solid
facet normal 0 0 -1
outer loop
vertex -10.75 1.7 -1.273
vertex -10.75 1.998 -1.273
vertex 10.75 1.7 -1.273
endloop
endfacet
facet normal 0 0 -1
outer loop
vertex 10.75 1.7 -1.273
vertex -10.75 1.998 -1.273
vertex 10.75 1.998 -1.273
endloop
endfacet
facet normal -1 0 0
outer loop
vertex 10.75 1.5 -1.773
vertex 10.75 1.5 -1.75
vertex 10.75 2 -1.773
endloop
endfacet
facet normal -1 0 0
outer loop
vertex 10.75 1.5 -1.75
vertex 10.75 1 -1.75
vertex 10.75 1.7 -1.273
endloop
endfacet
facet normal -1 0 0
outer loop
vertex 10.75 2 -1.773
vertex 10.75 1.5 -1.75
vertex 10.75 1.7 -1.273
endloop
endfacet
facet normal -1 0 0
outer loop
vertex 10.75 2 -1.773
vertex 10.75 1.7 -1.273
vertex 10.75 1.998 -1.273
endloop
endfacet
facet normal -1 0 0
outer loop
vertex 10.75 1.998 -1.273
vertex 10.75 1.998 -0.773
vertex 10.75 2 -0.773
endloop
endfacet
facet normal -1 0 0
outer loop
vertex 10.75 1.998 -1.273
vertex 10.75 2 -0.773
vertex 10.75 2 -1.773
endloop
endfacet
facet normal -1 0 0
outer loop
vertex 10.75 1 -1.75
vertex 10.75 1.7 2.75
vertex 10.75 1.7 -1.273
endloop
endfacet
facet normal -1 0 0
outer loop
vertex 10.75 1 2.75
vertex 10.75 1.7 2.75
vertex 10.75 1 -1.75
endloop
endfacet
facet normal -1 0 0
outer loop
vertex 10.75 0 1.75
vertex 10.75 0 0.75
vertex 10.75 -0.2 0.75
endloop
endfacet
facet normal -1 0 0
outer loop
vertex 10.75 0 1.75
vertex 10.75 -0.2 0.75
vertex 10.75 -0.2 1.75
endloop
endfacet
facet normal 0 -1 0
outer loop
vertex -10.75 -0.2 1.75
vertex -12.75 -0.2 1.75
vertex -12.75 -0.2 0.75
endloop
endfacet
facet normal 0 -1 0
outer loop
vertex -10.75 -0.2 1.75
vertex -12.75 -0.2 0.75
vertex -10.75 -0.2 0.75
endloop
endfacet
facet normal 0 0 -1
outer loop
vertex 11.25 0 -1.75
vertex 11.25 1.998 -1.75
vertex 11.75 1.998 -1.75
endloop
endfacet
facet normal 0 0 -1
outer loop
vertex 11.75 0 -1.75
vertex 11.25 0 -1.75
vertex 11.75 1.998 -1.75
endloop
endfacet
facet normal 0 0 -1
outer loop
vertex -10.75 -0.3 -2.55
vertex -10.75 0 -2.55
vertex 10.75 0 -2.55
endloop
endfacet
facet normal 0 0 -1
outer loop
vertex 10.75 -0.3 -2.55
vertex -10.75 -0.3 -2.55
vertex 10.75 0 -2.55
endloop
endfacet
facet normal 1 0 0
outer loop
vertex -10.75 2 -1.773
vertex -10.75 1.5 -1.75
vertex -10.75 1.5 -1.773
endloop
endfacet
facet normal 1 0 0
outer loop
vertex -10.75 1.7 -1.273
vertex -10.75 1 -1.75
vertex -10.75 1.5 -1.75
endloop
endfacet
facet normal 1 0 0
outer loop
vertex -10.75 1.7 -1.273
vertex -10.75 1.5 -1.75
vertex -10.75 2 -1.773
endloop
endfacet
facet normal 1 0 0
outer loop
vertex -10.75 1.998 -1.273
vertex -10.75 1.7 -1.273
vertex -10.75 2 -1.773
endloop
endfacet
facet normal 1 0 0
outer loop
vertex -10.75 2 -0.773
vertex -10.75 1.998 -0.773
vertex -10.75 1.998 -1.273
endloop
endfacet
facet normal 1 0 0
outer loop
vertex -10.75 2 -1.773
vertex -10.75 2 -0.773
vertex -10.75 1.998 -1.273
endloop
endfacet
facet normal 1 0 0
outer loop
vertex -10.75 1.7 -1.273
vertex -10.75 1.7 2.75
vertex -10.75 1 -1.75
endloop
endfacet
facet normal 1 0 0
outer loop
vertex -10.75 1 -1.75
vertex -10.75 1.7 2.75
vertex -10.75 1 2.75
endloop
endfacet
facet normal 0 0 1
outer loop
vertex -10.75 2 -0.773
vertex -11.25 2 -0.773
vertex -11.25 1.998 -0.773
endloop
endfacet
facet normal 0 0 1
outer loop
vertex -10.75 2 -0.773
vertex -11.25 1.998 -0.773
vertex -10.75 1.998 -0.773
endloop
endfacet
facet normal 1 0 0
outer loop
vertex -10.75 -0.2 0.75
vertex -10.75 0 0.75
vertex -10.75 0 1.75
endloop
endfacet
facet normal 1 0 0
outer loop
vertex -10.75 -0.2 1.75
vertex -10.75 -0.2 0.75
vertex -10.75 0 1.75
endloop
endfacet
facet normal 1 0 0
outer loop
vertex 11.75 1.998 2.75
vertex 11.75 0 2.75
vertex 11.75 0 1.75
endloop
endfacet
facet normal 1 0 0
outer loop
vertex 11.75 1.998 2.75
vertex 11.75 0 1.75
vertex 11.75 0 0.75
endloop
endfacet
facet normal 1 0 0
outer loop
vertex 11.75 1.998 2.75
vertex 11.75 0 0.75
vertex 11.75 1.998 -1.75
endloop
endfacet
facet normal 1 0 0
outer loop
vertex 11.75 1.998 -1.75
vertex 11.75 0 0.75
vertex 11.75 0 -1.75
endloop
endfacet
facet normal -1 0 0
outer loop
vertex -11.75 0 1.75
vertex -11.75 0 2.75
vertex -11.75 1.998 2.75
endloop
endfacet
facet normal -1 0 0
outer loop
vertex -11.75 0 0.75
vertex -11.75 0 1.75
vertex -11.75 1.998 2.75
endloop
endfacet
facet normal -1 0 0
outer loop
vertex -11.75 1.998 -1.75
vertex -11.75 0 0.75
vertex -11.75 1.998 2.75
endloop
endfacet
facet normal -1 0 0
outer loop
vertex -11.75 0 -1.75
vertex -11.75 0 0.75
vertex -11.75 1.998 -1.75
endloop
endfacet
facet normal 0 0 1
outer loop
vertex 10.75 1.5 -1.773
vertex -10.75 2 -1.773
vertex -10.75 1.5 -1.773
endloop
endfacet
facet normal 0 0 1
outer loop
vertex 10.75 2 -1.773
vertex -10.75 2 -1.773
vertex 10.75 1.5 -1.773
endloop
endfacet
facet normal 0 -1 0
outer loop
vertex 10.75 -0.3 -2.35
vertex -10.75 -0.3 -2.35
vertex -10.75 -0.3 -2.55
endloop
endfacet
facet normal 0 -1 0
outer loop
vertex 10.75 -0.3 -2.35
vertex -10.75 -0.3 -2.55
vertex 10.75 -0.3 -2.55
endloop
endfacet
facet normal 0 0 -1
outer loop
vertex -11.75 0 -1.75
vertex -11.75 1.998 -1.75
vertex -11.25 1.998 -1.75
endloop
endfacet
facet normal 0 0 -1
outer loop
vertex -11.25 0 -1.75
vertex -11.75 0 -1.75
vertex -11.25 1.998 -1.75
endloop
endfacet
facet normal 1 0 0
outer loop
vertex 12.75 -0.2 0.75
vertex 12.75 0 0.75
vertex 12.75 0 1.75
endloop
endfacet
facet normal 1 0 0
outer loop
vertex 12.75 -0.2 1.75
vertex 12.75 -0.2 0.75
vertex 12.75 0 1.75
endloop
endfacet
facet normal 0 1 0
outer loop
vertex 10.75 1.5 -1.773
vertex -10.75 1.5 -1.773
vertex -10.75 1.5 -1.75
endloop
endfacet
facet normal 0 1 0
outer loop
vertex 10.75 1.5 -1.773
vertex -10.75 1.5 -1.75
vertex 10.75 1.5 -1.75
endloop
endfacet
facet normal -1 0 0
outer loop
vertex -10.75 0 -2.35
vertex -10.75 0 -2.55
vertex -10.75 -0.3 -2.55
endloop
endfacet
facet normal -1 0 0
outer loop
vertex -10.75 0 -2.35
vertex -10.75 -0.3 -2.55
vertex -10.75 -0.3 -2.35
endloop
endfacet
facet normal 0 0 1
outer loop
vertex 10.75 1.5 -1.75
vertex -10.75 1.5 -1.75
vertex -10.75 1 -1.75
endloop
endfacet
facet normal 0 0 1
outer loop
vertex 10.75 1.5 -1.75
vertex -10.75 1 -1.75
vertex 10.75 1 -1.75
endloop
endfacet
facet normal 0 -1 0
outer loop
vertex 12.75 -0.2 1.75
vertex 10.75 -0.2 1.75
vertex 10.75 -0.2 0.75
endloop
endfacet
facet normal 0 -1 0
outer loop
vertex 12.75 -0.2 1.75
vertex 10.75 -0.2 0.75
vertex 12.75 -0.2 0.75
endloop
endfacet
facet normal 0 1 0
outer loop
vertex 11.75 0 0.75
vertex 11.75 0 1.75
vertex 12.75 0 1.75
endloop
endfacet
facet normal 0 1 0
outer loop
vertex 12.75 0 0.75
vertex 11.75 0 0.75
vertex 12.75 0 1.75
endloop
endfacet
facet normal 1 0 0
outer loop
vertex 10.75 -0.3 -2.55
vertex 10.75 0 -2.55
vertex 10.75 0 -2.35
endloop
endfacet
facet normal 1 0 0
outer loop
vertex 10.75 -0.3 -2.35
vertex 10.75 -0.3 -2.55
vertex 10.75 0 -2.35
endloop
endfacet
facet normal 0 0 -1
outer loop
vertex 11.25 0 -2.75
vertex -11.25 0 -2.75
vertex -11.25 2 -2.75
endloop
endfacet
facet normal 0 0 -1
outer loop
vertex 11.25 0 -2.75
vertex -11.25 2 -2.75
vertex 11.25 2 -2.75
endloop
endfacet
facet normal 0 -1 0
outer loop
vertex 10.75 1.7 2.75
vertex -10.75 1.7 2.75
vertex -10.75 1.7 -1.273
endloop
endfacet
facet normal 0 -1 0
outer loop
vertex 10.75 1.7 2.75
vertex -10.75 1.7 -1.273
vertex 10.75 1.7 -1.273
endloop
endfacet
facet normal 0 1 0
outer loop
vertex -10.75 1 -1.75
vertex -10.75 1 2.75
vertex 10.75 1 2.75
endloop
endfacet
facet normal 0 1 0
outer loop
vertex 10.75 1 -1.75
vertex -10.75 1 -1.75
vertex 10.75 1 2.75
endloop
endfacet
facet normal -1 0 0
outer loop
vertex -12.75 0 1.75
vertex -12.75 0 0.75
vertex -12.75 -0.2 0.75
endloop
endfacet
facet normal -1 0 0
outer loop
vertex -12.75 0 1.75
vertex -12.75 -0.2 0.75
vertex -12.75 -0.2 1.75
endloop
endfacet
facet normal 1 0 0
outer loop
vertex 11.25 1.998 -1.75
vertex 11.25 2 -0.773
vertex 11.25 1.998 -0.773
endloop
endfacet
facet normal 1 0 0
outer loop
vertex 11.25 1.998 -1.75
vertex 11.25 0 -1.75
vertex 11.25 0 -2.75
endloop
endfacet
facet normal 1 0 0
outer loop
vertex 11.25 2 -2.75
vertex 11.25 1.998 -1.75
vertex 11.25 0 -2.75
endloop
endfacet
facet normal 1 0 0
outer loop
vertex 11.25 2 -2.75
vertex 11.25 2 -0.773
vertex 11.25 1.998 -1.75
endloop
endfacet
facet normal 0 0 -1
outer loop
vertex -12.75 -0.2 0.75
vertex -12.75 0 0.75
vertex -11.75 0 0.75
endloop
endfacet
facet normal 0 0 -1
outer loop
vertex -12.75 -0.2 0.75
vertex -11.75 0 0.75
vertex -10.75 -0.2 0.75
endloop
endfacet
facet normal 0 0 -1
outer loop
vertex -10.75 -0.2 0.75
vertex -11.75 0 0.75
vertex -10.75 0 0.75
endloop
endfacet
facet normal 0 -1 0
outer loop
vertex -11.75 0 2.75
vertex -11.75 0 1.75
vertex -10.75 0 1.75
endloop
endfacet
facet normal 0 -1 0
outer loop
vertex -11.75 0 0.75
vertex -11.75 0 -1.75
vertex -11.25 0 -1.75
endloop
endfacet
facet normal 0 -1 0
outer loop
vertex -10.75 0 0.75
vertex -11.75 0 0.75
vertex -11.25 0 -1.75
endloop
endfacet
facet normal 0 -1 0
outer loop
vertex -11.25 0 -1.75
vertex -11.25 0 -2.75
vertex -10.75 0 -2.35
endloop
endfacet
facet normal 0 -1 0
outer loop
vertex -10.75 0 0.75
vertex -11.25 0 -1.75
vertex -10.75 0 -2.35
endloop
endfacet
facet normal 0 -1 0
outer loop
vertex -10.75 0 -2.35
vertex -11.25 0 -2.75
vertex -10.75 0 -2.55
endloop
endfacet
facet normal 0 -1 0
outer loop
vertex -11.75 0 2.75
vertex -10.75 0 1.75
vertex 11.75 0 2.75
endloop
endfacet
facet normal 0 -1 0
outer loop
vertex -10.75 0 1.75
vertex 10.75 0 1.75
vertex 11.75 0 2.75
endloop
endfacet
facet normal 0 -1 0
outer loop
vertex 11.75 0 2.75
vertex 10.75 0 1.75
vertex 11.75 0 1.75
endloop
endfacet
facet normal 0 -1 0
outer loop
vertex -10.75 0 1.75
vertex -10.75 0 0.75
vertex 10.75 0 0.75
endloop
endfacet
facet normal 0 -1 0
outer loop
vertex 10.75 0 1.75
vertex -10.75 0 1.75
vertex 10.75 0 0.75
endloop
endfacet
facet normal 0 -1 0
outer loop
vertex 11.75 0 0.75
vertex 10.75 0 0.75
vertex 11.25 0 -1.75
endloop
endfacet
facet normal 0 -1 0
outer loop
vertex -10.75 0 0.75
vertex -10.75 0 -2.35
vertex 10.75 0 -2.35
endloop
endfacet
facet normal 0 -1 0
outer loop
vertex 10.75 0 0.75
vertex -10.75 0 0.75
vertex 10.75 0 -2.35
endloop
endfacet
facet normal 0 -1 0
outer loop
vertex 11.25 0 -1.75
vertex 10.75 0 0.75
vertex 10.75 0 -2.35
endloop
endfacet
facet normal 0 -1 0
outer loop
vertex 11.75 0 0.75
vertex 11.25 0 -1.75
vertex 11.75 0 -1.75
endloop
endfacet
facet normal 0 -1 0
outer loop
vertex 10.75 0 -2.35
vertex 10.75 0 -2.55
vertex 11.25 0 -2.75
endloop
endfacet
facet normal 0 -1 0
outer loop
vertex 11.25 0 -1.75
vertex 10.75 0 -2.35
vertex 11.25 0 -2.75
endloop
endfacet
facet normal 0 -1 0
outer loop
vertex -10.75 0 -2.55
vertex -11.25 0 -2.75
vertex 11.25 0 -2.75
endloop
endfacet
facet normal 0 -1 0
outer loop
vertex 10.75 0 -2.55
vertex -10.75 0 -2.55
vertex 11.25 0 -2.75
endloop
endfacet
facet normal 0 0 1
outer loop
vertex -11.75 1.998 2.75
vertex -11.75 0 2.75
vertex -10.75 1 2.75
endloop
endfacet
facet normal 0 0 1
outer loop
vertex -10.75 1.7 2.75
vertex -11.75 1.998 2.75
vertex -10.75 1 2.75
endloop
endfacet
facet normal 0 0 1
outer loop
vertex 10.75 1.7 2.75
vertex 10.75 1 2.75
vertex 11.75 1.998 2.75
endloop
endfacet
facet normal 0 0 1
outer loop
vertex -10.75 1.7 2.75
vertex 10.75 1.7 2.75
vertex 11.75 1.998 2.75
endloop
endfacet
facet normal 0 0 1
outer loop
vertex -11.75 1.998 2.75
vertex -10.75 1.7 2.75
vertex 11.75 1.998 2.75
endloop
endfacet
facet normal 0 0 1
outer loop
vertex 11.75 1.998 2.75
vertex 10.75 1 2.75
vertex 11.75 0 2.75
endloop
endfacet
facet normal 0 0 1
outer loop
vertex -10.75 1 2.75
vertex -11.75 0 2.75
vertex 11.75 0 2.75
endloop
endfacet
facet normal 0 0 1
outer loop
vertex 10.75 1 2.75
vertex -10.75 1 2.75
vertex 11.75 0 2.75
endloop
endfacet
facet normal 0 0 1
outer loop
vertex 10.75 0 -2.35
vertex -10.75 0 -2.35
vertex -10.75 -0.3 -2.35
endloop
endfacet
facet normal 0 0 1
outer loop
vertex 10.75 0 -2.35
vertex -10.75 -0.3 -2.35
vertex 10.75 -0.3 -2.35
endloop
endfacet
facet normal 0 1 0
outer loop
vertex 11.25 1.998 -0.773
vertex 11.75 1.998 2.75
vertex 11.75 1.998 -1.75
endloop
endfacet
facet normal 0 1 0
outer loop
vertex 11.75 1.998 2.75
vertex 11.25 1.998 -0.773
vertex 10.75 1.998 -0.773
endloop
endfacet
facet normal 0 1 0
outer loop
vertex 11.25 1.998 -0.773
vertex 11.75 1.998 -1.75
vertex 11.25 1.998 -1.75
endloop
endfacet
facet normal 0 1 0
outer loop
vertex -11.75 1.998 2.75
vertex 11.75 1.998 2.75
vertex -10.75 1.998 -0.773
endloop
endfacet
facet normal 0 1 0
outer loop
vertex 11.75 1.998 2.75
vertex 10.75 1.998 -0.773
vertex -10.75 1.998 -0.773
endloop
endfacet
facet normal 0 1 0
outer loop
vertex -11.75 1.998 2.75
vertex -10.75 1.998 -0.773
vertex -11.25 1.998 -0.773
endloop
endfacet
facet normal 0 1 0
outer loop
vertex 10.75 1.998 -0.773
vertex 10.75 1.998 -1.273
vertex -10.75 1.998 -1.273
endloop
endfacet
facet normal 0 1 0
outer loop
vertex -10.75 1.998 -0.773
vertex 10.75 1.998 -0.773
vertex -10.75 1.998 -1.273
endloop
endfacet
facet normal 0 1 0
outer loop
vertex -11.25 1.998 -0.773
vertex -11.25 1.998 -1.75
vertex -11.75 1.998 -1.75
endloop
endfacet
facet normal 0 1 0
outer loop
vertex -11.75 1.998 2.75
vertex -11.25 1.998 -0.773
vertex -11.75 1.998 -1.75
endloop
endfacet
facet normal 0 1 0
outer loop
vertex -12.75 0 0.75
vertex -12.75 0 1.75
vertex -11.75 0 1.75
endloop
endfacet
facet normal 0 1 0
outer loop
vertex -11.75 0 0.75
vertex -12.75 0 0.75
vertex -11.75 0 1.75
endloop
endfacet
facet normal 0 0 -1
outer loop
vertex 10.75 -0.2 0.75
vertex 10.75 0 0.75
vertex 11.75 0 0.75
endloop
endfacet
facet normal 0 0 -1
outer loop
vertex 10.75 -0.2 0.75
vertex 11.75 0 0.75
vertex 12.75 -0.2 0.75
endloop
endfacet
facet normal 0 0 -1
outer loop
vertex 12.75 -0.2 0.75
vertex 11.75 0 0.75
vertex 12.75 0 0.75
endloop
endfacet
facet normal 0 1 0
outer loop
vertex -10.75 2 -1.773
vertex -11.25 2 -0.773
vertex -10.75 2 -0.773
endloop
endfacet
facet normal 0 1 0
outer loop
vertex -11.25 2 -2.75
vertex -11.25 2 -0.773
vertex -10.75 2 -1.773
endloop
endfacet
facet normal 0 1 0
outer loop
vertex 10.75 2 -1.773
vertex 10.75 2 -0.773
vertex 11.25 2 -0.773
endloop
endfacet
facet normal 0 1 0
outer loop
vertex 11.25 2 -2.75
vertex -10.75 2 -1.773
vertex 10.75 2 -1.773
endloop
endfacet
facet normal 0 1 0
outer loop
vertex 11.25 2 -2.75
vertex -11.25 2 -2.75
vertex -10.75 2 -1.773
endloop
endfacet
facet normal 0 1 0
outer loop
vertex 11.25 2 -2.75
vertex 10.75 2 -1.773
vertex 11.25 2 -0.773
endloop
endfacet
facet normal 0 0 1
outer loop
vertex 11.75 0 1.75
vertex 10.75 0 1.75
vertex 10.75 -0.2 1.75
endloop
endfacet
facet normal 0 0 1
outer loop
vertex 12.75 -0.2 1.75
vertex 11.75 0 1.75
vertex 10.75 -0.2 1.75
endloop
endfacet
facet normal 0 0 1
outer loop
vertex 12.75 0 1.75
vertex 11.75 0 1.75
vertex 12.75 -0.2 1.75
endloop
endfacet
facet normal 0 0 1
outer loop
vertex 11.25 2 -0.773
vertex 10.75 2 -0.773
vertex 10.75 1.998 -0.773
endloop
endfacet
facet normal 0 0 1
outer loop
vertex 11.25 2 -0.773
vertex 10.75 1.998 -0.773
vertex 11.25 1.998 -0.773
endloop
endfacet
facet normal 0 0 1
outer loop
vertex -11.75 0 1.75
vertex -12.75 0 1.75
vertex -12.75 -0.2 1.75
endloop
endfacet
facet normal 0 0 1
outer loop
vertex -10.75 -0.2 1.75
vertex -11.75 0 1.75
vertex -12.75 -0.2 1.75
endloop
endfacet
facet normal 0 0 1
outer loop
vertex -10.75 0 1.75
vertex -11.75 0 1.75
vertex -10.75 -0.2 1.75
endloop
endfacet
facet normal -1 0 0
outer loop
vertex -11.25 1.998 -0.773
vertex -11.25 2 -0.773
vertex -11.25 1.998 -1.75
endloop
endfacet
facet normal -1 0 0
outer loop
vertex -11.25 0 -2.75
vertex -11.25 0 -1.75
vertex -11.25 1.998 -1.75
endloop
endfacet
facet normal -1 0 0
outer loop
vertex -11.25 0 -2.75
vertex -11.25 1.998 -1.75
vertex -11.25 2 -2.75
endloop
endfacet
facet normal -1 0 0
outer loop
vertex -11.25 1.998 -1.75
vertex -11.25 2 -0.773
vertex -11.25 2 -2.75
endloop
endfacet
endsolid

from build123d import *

# Parameters (mm, degrees)
SKETCH_1_W          = 23.5
SKETCH_1_H          = 5.5
EXTRUDE_1_DEPTH     = 2
SKETCH_2_W          = 0.5
SKETCH_2_H          = 1
CUT_EXTRUDE_1_DEPTH = 13.232129823
SKETCH_4_W          = 2
SKETCH_4_H          = 1
EXTRUDE_2_DEPTH     = 0.2
SKETCH_5_W          = 21.5
SKETCH_5_H          = 0.2
EXTRUDE_3_DEPTH     = 0.3
SKETCH_6_W          = 21.5
SKETCH_6_H          = 0.7
CUT_EXTRUDE_2_DEPTH = 4.5
CUT_EXTRUDE_3_DEPTH = 0.002
SKETCH_8_W          = 21.5
SKETCH_8_H          = 0.5
CUT_EXTRUDE_4_DEPTH = 0.5


with BuildPart() as part:
    # 草图1 → 凸台-拉伸1 (new body)
    with BuildSketch(Plane(origin=(0, 0, 0), x_dir=(1, 0, 0), z_dir=(0, 1, 0))):
        Rectangle(SKETCH_1_W, SKETCH_1_H)
    extrude(amount=EXTRUDE_1_DEPTH)

    # 草图2 → 切除-拉伸1 (cut, through all)
    with BuildSketch(Plane(origin=(0, 2, 0), x_dir=(1, 0, 0), z_dir=(0, 1, 0))):
        with Locations((-11.5, 2.25)):
            Rectangle(SKETCH_2_W, SKETCH_2_H)
        with Locations((11.5, 2.25)):
            Rectangle(SKETCH_2_W, SKETCH_2_H)
    extrude(amount=-CUT_EXTRUDE_1_DEPTH, mode=Mode.SUBTRACT)

    # 草图4 → 凸台-拉伸2 (add)
    with BuildSketch(Plane.XZ):
        with Locations((-11.75, 1.25)):
            Rectangle(SKETCH_4_W, SKETCH_4_H)
        with Locations((11.75, 1.25)):
            Rectangle(SKETCH_4_W, SKETCH_4_H)
    extrude(amount=EXTRUDE_2_DEPTH)

    # 草图5 → 凸台-拉伸3 (add)
    with BuildSketch(Plane.XZ):
        with Locations((0, -2.45)):
            Rectangle(SKETCH_5_W, SKETCH_5_H)
    extrude(amount=EXTRUDE_3_DEPTH)

    # 草图6 → 切除-拉伸2 (cut)
    with BuildSketch(Plane.XY.offset(2.75)):
        with Locations((0, 1.35)):
            Rectangle(SKETCH_6_W, SKETCH_6_H)
    extrude(amount=-CUT_EXTRUDE_2_DEPTH, mode=Mode.SUBTRACT)

    # 草图7 → 切除-拉伸3 (cut)
    with BuildSketch(Plane(origin=(0, 2, 0), x_dir=(1, 0, 0), z_dir=(0, 1, 0))):
        Polygon((-11.25, 1.75), (-11.25, 0.773341088), (-10.75, 0.773341088), (-10.75, 1.273341088), (10.75, 1.273341088), (10.75, 0.773341088), (11.25, 0.773341088), (11.25, 1.75), (11.75, 1.75), (11.75, -2.75), (-11.75, -2.75), (-11.75, 1.75), align=None)
    extrude(amount=-CUT_EXTRUDE_3_DEPTH, mode=Mode.SUBTRACT)

    # 草图8 → 切除-拉伸4 (cut)
    with BuildSketch(Plane(origin=(0, 2, 0), x_dir=(1, 0, 0), z_dir=(0, 1, 0))):
        with Locations((0, 1.523341088)):
            Rectangle(SKETCH_8_W, SKETCH_8_H)
    extrude(amount=-CUT_EXTRUDE_4_DEPTH, mode=Mode.SUBTRACT)


solid = part.part
